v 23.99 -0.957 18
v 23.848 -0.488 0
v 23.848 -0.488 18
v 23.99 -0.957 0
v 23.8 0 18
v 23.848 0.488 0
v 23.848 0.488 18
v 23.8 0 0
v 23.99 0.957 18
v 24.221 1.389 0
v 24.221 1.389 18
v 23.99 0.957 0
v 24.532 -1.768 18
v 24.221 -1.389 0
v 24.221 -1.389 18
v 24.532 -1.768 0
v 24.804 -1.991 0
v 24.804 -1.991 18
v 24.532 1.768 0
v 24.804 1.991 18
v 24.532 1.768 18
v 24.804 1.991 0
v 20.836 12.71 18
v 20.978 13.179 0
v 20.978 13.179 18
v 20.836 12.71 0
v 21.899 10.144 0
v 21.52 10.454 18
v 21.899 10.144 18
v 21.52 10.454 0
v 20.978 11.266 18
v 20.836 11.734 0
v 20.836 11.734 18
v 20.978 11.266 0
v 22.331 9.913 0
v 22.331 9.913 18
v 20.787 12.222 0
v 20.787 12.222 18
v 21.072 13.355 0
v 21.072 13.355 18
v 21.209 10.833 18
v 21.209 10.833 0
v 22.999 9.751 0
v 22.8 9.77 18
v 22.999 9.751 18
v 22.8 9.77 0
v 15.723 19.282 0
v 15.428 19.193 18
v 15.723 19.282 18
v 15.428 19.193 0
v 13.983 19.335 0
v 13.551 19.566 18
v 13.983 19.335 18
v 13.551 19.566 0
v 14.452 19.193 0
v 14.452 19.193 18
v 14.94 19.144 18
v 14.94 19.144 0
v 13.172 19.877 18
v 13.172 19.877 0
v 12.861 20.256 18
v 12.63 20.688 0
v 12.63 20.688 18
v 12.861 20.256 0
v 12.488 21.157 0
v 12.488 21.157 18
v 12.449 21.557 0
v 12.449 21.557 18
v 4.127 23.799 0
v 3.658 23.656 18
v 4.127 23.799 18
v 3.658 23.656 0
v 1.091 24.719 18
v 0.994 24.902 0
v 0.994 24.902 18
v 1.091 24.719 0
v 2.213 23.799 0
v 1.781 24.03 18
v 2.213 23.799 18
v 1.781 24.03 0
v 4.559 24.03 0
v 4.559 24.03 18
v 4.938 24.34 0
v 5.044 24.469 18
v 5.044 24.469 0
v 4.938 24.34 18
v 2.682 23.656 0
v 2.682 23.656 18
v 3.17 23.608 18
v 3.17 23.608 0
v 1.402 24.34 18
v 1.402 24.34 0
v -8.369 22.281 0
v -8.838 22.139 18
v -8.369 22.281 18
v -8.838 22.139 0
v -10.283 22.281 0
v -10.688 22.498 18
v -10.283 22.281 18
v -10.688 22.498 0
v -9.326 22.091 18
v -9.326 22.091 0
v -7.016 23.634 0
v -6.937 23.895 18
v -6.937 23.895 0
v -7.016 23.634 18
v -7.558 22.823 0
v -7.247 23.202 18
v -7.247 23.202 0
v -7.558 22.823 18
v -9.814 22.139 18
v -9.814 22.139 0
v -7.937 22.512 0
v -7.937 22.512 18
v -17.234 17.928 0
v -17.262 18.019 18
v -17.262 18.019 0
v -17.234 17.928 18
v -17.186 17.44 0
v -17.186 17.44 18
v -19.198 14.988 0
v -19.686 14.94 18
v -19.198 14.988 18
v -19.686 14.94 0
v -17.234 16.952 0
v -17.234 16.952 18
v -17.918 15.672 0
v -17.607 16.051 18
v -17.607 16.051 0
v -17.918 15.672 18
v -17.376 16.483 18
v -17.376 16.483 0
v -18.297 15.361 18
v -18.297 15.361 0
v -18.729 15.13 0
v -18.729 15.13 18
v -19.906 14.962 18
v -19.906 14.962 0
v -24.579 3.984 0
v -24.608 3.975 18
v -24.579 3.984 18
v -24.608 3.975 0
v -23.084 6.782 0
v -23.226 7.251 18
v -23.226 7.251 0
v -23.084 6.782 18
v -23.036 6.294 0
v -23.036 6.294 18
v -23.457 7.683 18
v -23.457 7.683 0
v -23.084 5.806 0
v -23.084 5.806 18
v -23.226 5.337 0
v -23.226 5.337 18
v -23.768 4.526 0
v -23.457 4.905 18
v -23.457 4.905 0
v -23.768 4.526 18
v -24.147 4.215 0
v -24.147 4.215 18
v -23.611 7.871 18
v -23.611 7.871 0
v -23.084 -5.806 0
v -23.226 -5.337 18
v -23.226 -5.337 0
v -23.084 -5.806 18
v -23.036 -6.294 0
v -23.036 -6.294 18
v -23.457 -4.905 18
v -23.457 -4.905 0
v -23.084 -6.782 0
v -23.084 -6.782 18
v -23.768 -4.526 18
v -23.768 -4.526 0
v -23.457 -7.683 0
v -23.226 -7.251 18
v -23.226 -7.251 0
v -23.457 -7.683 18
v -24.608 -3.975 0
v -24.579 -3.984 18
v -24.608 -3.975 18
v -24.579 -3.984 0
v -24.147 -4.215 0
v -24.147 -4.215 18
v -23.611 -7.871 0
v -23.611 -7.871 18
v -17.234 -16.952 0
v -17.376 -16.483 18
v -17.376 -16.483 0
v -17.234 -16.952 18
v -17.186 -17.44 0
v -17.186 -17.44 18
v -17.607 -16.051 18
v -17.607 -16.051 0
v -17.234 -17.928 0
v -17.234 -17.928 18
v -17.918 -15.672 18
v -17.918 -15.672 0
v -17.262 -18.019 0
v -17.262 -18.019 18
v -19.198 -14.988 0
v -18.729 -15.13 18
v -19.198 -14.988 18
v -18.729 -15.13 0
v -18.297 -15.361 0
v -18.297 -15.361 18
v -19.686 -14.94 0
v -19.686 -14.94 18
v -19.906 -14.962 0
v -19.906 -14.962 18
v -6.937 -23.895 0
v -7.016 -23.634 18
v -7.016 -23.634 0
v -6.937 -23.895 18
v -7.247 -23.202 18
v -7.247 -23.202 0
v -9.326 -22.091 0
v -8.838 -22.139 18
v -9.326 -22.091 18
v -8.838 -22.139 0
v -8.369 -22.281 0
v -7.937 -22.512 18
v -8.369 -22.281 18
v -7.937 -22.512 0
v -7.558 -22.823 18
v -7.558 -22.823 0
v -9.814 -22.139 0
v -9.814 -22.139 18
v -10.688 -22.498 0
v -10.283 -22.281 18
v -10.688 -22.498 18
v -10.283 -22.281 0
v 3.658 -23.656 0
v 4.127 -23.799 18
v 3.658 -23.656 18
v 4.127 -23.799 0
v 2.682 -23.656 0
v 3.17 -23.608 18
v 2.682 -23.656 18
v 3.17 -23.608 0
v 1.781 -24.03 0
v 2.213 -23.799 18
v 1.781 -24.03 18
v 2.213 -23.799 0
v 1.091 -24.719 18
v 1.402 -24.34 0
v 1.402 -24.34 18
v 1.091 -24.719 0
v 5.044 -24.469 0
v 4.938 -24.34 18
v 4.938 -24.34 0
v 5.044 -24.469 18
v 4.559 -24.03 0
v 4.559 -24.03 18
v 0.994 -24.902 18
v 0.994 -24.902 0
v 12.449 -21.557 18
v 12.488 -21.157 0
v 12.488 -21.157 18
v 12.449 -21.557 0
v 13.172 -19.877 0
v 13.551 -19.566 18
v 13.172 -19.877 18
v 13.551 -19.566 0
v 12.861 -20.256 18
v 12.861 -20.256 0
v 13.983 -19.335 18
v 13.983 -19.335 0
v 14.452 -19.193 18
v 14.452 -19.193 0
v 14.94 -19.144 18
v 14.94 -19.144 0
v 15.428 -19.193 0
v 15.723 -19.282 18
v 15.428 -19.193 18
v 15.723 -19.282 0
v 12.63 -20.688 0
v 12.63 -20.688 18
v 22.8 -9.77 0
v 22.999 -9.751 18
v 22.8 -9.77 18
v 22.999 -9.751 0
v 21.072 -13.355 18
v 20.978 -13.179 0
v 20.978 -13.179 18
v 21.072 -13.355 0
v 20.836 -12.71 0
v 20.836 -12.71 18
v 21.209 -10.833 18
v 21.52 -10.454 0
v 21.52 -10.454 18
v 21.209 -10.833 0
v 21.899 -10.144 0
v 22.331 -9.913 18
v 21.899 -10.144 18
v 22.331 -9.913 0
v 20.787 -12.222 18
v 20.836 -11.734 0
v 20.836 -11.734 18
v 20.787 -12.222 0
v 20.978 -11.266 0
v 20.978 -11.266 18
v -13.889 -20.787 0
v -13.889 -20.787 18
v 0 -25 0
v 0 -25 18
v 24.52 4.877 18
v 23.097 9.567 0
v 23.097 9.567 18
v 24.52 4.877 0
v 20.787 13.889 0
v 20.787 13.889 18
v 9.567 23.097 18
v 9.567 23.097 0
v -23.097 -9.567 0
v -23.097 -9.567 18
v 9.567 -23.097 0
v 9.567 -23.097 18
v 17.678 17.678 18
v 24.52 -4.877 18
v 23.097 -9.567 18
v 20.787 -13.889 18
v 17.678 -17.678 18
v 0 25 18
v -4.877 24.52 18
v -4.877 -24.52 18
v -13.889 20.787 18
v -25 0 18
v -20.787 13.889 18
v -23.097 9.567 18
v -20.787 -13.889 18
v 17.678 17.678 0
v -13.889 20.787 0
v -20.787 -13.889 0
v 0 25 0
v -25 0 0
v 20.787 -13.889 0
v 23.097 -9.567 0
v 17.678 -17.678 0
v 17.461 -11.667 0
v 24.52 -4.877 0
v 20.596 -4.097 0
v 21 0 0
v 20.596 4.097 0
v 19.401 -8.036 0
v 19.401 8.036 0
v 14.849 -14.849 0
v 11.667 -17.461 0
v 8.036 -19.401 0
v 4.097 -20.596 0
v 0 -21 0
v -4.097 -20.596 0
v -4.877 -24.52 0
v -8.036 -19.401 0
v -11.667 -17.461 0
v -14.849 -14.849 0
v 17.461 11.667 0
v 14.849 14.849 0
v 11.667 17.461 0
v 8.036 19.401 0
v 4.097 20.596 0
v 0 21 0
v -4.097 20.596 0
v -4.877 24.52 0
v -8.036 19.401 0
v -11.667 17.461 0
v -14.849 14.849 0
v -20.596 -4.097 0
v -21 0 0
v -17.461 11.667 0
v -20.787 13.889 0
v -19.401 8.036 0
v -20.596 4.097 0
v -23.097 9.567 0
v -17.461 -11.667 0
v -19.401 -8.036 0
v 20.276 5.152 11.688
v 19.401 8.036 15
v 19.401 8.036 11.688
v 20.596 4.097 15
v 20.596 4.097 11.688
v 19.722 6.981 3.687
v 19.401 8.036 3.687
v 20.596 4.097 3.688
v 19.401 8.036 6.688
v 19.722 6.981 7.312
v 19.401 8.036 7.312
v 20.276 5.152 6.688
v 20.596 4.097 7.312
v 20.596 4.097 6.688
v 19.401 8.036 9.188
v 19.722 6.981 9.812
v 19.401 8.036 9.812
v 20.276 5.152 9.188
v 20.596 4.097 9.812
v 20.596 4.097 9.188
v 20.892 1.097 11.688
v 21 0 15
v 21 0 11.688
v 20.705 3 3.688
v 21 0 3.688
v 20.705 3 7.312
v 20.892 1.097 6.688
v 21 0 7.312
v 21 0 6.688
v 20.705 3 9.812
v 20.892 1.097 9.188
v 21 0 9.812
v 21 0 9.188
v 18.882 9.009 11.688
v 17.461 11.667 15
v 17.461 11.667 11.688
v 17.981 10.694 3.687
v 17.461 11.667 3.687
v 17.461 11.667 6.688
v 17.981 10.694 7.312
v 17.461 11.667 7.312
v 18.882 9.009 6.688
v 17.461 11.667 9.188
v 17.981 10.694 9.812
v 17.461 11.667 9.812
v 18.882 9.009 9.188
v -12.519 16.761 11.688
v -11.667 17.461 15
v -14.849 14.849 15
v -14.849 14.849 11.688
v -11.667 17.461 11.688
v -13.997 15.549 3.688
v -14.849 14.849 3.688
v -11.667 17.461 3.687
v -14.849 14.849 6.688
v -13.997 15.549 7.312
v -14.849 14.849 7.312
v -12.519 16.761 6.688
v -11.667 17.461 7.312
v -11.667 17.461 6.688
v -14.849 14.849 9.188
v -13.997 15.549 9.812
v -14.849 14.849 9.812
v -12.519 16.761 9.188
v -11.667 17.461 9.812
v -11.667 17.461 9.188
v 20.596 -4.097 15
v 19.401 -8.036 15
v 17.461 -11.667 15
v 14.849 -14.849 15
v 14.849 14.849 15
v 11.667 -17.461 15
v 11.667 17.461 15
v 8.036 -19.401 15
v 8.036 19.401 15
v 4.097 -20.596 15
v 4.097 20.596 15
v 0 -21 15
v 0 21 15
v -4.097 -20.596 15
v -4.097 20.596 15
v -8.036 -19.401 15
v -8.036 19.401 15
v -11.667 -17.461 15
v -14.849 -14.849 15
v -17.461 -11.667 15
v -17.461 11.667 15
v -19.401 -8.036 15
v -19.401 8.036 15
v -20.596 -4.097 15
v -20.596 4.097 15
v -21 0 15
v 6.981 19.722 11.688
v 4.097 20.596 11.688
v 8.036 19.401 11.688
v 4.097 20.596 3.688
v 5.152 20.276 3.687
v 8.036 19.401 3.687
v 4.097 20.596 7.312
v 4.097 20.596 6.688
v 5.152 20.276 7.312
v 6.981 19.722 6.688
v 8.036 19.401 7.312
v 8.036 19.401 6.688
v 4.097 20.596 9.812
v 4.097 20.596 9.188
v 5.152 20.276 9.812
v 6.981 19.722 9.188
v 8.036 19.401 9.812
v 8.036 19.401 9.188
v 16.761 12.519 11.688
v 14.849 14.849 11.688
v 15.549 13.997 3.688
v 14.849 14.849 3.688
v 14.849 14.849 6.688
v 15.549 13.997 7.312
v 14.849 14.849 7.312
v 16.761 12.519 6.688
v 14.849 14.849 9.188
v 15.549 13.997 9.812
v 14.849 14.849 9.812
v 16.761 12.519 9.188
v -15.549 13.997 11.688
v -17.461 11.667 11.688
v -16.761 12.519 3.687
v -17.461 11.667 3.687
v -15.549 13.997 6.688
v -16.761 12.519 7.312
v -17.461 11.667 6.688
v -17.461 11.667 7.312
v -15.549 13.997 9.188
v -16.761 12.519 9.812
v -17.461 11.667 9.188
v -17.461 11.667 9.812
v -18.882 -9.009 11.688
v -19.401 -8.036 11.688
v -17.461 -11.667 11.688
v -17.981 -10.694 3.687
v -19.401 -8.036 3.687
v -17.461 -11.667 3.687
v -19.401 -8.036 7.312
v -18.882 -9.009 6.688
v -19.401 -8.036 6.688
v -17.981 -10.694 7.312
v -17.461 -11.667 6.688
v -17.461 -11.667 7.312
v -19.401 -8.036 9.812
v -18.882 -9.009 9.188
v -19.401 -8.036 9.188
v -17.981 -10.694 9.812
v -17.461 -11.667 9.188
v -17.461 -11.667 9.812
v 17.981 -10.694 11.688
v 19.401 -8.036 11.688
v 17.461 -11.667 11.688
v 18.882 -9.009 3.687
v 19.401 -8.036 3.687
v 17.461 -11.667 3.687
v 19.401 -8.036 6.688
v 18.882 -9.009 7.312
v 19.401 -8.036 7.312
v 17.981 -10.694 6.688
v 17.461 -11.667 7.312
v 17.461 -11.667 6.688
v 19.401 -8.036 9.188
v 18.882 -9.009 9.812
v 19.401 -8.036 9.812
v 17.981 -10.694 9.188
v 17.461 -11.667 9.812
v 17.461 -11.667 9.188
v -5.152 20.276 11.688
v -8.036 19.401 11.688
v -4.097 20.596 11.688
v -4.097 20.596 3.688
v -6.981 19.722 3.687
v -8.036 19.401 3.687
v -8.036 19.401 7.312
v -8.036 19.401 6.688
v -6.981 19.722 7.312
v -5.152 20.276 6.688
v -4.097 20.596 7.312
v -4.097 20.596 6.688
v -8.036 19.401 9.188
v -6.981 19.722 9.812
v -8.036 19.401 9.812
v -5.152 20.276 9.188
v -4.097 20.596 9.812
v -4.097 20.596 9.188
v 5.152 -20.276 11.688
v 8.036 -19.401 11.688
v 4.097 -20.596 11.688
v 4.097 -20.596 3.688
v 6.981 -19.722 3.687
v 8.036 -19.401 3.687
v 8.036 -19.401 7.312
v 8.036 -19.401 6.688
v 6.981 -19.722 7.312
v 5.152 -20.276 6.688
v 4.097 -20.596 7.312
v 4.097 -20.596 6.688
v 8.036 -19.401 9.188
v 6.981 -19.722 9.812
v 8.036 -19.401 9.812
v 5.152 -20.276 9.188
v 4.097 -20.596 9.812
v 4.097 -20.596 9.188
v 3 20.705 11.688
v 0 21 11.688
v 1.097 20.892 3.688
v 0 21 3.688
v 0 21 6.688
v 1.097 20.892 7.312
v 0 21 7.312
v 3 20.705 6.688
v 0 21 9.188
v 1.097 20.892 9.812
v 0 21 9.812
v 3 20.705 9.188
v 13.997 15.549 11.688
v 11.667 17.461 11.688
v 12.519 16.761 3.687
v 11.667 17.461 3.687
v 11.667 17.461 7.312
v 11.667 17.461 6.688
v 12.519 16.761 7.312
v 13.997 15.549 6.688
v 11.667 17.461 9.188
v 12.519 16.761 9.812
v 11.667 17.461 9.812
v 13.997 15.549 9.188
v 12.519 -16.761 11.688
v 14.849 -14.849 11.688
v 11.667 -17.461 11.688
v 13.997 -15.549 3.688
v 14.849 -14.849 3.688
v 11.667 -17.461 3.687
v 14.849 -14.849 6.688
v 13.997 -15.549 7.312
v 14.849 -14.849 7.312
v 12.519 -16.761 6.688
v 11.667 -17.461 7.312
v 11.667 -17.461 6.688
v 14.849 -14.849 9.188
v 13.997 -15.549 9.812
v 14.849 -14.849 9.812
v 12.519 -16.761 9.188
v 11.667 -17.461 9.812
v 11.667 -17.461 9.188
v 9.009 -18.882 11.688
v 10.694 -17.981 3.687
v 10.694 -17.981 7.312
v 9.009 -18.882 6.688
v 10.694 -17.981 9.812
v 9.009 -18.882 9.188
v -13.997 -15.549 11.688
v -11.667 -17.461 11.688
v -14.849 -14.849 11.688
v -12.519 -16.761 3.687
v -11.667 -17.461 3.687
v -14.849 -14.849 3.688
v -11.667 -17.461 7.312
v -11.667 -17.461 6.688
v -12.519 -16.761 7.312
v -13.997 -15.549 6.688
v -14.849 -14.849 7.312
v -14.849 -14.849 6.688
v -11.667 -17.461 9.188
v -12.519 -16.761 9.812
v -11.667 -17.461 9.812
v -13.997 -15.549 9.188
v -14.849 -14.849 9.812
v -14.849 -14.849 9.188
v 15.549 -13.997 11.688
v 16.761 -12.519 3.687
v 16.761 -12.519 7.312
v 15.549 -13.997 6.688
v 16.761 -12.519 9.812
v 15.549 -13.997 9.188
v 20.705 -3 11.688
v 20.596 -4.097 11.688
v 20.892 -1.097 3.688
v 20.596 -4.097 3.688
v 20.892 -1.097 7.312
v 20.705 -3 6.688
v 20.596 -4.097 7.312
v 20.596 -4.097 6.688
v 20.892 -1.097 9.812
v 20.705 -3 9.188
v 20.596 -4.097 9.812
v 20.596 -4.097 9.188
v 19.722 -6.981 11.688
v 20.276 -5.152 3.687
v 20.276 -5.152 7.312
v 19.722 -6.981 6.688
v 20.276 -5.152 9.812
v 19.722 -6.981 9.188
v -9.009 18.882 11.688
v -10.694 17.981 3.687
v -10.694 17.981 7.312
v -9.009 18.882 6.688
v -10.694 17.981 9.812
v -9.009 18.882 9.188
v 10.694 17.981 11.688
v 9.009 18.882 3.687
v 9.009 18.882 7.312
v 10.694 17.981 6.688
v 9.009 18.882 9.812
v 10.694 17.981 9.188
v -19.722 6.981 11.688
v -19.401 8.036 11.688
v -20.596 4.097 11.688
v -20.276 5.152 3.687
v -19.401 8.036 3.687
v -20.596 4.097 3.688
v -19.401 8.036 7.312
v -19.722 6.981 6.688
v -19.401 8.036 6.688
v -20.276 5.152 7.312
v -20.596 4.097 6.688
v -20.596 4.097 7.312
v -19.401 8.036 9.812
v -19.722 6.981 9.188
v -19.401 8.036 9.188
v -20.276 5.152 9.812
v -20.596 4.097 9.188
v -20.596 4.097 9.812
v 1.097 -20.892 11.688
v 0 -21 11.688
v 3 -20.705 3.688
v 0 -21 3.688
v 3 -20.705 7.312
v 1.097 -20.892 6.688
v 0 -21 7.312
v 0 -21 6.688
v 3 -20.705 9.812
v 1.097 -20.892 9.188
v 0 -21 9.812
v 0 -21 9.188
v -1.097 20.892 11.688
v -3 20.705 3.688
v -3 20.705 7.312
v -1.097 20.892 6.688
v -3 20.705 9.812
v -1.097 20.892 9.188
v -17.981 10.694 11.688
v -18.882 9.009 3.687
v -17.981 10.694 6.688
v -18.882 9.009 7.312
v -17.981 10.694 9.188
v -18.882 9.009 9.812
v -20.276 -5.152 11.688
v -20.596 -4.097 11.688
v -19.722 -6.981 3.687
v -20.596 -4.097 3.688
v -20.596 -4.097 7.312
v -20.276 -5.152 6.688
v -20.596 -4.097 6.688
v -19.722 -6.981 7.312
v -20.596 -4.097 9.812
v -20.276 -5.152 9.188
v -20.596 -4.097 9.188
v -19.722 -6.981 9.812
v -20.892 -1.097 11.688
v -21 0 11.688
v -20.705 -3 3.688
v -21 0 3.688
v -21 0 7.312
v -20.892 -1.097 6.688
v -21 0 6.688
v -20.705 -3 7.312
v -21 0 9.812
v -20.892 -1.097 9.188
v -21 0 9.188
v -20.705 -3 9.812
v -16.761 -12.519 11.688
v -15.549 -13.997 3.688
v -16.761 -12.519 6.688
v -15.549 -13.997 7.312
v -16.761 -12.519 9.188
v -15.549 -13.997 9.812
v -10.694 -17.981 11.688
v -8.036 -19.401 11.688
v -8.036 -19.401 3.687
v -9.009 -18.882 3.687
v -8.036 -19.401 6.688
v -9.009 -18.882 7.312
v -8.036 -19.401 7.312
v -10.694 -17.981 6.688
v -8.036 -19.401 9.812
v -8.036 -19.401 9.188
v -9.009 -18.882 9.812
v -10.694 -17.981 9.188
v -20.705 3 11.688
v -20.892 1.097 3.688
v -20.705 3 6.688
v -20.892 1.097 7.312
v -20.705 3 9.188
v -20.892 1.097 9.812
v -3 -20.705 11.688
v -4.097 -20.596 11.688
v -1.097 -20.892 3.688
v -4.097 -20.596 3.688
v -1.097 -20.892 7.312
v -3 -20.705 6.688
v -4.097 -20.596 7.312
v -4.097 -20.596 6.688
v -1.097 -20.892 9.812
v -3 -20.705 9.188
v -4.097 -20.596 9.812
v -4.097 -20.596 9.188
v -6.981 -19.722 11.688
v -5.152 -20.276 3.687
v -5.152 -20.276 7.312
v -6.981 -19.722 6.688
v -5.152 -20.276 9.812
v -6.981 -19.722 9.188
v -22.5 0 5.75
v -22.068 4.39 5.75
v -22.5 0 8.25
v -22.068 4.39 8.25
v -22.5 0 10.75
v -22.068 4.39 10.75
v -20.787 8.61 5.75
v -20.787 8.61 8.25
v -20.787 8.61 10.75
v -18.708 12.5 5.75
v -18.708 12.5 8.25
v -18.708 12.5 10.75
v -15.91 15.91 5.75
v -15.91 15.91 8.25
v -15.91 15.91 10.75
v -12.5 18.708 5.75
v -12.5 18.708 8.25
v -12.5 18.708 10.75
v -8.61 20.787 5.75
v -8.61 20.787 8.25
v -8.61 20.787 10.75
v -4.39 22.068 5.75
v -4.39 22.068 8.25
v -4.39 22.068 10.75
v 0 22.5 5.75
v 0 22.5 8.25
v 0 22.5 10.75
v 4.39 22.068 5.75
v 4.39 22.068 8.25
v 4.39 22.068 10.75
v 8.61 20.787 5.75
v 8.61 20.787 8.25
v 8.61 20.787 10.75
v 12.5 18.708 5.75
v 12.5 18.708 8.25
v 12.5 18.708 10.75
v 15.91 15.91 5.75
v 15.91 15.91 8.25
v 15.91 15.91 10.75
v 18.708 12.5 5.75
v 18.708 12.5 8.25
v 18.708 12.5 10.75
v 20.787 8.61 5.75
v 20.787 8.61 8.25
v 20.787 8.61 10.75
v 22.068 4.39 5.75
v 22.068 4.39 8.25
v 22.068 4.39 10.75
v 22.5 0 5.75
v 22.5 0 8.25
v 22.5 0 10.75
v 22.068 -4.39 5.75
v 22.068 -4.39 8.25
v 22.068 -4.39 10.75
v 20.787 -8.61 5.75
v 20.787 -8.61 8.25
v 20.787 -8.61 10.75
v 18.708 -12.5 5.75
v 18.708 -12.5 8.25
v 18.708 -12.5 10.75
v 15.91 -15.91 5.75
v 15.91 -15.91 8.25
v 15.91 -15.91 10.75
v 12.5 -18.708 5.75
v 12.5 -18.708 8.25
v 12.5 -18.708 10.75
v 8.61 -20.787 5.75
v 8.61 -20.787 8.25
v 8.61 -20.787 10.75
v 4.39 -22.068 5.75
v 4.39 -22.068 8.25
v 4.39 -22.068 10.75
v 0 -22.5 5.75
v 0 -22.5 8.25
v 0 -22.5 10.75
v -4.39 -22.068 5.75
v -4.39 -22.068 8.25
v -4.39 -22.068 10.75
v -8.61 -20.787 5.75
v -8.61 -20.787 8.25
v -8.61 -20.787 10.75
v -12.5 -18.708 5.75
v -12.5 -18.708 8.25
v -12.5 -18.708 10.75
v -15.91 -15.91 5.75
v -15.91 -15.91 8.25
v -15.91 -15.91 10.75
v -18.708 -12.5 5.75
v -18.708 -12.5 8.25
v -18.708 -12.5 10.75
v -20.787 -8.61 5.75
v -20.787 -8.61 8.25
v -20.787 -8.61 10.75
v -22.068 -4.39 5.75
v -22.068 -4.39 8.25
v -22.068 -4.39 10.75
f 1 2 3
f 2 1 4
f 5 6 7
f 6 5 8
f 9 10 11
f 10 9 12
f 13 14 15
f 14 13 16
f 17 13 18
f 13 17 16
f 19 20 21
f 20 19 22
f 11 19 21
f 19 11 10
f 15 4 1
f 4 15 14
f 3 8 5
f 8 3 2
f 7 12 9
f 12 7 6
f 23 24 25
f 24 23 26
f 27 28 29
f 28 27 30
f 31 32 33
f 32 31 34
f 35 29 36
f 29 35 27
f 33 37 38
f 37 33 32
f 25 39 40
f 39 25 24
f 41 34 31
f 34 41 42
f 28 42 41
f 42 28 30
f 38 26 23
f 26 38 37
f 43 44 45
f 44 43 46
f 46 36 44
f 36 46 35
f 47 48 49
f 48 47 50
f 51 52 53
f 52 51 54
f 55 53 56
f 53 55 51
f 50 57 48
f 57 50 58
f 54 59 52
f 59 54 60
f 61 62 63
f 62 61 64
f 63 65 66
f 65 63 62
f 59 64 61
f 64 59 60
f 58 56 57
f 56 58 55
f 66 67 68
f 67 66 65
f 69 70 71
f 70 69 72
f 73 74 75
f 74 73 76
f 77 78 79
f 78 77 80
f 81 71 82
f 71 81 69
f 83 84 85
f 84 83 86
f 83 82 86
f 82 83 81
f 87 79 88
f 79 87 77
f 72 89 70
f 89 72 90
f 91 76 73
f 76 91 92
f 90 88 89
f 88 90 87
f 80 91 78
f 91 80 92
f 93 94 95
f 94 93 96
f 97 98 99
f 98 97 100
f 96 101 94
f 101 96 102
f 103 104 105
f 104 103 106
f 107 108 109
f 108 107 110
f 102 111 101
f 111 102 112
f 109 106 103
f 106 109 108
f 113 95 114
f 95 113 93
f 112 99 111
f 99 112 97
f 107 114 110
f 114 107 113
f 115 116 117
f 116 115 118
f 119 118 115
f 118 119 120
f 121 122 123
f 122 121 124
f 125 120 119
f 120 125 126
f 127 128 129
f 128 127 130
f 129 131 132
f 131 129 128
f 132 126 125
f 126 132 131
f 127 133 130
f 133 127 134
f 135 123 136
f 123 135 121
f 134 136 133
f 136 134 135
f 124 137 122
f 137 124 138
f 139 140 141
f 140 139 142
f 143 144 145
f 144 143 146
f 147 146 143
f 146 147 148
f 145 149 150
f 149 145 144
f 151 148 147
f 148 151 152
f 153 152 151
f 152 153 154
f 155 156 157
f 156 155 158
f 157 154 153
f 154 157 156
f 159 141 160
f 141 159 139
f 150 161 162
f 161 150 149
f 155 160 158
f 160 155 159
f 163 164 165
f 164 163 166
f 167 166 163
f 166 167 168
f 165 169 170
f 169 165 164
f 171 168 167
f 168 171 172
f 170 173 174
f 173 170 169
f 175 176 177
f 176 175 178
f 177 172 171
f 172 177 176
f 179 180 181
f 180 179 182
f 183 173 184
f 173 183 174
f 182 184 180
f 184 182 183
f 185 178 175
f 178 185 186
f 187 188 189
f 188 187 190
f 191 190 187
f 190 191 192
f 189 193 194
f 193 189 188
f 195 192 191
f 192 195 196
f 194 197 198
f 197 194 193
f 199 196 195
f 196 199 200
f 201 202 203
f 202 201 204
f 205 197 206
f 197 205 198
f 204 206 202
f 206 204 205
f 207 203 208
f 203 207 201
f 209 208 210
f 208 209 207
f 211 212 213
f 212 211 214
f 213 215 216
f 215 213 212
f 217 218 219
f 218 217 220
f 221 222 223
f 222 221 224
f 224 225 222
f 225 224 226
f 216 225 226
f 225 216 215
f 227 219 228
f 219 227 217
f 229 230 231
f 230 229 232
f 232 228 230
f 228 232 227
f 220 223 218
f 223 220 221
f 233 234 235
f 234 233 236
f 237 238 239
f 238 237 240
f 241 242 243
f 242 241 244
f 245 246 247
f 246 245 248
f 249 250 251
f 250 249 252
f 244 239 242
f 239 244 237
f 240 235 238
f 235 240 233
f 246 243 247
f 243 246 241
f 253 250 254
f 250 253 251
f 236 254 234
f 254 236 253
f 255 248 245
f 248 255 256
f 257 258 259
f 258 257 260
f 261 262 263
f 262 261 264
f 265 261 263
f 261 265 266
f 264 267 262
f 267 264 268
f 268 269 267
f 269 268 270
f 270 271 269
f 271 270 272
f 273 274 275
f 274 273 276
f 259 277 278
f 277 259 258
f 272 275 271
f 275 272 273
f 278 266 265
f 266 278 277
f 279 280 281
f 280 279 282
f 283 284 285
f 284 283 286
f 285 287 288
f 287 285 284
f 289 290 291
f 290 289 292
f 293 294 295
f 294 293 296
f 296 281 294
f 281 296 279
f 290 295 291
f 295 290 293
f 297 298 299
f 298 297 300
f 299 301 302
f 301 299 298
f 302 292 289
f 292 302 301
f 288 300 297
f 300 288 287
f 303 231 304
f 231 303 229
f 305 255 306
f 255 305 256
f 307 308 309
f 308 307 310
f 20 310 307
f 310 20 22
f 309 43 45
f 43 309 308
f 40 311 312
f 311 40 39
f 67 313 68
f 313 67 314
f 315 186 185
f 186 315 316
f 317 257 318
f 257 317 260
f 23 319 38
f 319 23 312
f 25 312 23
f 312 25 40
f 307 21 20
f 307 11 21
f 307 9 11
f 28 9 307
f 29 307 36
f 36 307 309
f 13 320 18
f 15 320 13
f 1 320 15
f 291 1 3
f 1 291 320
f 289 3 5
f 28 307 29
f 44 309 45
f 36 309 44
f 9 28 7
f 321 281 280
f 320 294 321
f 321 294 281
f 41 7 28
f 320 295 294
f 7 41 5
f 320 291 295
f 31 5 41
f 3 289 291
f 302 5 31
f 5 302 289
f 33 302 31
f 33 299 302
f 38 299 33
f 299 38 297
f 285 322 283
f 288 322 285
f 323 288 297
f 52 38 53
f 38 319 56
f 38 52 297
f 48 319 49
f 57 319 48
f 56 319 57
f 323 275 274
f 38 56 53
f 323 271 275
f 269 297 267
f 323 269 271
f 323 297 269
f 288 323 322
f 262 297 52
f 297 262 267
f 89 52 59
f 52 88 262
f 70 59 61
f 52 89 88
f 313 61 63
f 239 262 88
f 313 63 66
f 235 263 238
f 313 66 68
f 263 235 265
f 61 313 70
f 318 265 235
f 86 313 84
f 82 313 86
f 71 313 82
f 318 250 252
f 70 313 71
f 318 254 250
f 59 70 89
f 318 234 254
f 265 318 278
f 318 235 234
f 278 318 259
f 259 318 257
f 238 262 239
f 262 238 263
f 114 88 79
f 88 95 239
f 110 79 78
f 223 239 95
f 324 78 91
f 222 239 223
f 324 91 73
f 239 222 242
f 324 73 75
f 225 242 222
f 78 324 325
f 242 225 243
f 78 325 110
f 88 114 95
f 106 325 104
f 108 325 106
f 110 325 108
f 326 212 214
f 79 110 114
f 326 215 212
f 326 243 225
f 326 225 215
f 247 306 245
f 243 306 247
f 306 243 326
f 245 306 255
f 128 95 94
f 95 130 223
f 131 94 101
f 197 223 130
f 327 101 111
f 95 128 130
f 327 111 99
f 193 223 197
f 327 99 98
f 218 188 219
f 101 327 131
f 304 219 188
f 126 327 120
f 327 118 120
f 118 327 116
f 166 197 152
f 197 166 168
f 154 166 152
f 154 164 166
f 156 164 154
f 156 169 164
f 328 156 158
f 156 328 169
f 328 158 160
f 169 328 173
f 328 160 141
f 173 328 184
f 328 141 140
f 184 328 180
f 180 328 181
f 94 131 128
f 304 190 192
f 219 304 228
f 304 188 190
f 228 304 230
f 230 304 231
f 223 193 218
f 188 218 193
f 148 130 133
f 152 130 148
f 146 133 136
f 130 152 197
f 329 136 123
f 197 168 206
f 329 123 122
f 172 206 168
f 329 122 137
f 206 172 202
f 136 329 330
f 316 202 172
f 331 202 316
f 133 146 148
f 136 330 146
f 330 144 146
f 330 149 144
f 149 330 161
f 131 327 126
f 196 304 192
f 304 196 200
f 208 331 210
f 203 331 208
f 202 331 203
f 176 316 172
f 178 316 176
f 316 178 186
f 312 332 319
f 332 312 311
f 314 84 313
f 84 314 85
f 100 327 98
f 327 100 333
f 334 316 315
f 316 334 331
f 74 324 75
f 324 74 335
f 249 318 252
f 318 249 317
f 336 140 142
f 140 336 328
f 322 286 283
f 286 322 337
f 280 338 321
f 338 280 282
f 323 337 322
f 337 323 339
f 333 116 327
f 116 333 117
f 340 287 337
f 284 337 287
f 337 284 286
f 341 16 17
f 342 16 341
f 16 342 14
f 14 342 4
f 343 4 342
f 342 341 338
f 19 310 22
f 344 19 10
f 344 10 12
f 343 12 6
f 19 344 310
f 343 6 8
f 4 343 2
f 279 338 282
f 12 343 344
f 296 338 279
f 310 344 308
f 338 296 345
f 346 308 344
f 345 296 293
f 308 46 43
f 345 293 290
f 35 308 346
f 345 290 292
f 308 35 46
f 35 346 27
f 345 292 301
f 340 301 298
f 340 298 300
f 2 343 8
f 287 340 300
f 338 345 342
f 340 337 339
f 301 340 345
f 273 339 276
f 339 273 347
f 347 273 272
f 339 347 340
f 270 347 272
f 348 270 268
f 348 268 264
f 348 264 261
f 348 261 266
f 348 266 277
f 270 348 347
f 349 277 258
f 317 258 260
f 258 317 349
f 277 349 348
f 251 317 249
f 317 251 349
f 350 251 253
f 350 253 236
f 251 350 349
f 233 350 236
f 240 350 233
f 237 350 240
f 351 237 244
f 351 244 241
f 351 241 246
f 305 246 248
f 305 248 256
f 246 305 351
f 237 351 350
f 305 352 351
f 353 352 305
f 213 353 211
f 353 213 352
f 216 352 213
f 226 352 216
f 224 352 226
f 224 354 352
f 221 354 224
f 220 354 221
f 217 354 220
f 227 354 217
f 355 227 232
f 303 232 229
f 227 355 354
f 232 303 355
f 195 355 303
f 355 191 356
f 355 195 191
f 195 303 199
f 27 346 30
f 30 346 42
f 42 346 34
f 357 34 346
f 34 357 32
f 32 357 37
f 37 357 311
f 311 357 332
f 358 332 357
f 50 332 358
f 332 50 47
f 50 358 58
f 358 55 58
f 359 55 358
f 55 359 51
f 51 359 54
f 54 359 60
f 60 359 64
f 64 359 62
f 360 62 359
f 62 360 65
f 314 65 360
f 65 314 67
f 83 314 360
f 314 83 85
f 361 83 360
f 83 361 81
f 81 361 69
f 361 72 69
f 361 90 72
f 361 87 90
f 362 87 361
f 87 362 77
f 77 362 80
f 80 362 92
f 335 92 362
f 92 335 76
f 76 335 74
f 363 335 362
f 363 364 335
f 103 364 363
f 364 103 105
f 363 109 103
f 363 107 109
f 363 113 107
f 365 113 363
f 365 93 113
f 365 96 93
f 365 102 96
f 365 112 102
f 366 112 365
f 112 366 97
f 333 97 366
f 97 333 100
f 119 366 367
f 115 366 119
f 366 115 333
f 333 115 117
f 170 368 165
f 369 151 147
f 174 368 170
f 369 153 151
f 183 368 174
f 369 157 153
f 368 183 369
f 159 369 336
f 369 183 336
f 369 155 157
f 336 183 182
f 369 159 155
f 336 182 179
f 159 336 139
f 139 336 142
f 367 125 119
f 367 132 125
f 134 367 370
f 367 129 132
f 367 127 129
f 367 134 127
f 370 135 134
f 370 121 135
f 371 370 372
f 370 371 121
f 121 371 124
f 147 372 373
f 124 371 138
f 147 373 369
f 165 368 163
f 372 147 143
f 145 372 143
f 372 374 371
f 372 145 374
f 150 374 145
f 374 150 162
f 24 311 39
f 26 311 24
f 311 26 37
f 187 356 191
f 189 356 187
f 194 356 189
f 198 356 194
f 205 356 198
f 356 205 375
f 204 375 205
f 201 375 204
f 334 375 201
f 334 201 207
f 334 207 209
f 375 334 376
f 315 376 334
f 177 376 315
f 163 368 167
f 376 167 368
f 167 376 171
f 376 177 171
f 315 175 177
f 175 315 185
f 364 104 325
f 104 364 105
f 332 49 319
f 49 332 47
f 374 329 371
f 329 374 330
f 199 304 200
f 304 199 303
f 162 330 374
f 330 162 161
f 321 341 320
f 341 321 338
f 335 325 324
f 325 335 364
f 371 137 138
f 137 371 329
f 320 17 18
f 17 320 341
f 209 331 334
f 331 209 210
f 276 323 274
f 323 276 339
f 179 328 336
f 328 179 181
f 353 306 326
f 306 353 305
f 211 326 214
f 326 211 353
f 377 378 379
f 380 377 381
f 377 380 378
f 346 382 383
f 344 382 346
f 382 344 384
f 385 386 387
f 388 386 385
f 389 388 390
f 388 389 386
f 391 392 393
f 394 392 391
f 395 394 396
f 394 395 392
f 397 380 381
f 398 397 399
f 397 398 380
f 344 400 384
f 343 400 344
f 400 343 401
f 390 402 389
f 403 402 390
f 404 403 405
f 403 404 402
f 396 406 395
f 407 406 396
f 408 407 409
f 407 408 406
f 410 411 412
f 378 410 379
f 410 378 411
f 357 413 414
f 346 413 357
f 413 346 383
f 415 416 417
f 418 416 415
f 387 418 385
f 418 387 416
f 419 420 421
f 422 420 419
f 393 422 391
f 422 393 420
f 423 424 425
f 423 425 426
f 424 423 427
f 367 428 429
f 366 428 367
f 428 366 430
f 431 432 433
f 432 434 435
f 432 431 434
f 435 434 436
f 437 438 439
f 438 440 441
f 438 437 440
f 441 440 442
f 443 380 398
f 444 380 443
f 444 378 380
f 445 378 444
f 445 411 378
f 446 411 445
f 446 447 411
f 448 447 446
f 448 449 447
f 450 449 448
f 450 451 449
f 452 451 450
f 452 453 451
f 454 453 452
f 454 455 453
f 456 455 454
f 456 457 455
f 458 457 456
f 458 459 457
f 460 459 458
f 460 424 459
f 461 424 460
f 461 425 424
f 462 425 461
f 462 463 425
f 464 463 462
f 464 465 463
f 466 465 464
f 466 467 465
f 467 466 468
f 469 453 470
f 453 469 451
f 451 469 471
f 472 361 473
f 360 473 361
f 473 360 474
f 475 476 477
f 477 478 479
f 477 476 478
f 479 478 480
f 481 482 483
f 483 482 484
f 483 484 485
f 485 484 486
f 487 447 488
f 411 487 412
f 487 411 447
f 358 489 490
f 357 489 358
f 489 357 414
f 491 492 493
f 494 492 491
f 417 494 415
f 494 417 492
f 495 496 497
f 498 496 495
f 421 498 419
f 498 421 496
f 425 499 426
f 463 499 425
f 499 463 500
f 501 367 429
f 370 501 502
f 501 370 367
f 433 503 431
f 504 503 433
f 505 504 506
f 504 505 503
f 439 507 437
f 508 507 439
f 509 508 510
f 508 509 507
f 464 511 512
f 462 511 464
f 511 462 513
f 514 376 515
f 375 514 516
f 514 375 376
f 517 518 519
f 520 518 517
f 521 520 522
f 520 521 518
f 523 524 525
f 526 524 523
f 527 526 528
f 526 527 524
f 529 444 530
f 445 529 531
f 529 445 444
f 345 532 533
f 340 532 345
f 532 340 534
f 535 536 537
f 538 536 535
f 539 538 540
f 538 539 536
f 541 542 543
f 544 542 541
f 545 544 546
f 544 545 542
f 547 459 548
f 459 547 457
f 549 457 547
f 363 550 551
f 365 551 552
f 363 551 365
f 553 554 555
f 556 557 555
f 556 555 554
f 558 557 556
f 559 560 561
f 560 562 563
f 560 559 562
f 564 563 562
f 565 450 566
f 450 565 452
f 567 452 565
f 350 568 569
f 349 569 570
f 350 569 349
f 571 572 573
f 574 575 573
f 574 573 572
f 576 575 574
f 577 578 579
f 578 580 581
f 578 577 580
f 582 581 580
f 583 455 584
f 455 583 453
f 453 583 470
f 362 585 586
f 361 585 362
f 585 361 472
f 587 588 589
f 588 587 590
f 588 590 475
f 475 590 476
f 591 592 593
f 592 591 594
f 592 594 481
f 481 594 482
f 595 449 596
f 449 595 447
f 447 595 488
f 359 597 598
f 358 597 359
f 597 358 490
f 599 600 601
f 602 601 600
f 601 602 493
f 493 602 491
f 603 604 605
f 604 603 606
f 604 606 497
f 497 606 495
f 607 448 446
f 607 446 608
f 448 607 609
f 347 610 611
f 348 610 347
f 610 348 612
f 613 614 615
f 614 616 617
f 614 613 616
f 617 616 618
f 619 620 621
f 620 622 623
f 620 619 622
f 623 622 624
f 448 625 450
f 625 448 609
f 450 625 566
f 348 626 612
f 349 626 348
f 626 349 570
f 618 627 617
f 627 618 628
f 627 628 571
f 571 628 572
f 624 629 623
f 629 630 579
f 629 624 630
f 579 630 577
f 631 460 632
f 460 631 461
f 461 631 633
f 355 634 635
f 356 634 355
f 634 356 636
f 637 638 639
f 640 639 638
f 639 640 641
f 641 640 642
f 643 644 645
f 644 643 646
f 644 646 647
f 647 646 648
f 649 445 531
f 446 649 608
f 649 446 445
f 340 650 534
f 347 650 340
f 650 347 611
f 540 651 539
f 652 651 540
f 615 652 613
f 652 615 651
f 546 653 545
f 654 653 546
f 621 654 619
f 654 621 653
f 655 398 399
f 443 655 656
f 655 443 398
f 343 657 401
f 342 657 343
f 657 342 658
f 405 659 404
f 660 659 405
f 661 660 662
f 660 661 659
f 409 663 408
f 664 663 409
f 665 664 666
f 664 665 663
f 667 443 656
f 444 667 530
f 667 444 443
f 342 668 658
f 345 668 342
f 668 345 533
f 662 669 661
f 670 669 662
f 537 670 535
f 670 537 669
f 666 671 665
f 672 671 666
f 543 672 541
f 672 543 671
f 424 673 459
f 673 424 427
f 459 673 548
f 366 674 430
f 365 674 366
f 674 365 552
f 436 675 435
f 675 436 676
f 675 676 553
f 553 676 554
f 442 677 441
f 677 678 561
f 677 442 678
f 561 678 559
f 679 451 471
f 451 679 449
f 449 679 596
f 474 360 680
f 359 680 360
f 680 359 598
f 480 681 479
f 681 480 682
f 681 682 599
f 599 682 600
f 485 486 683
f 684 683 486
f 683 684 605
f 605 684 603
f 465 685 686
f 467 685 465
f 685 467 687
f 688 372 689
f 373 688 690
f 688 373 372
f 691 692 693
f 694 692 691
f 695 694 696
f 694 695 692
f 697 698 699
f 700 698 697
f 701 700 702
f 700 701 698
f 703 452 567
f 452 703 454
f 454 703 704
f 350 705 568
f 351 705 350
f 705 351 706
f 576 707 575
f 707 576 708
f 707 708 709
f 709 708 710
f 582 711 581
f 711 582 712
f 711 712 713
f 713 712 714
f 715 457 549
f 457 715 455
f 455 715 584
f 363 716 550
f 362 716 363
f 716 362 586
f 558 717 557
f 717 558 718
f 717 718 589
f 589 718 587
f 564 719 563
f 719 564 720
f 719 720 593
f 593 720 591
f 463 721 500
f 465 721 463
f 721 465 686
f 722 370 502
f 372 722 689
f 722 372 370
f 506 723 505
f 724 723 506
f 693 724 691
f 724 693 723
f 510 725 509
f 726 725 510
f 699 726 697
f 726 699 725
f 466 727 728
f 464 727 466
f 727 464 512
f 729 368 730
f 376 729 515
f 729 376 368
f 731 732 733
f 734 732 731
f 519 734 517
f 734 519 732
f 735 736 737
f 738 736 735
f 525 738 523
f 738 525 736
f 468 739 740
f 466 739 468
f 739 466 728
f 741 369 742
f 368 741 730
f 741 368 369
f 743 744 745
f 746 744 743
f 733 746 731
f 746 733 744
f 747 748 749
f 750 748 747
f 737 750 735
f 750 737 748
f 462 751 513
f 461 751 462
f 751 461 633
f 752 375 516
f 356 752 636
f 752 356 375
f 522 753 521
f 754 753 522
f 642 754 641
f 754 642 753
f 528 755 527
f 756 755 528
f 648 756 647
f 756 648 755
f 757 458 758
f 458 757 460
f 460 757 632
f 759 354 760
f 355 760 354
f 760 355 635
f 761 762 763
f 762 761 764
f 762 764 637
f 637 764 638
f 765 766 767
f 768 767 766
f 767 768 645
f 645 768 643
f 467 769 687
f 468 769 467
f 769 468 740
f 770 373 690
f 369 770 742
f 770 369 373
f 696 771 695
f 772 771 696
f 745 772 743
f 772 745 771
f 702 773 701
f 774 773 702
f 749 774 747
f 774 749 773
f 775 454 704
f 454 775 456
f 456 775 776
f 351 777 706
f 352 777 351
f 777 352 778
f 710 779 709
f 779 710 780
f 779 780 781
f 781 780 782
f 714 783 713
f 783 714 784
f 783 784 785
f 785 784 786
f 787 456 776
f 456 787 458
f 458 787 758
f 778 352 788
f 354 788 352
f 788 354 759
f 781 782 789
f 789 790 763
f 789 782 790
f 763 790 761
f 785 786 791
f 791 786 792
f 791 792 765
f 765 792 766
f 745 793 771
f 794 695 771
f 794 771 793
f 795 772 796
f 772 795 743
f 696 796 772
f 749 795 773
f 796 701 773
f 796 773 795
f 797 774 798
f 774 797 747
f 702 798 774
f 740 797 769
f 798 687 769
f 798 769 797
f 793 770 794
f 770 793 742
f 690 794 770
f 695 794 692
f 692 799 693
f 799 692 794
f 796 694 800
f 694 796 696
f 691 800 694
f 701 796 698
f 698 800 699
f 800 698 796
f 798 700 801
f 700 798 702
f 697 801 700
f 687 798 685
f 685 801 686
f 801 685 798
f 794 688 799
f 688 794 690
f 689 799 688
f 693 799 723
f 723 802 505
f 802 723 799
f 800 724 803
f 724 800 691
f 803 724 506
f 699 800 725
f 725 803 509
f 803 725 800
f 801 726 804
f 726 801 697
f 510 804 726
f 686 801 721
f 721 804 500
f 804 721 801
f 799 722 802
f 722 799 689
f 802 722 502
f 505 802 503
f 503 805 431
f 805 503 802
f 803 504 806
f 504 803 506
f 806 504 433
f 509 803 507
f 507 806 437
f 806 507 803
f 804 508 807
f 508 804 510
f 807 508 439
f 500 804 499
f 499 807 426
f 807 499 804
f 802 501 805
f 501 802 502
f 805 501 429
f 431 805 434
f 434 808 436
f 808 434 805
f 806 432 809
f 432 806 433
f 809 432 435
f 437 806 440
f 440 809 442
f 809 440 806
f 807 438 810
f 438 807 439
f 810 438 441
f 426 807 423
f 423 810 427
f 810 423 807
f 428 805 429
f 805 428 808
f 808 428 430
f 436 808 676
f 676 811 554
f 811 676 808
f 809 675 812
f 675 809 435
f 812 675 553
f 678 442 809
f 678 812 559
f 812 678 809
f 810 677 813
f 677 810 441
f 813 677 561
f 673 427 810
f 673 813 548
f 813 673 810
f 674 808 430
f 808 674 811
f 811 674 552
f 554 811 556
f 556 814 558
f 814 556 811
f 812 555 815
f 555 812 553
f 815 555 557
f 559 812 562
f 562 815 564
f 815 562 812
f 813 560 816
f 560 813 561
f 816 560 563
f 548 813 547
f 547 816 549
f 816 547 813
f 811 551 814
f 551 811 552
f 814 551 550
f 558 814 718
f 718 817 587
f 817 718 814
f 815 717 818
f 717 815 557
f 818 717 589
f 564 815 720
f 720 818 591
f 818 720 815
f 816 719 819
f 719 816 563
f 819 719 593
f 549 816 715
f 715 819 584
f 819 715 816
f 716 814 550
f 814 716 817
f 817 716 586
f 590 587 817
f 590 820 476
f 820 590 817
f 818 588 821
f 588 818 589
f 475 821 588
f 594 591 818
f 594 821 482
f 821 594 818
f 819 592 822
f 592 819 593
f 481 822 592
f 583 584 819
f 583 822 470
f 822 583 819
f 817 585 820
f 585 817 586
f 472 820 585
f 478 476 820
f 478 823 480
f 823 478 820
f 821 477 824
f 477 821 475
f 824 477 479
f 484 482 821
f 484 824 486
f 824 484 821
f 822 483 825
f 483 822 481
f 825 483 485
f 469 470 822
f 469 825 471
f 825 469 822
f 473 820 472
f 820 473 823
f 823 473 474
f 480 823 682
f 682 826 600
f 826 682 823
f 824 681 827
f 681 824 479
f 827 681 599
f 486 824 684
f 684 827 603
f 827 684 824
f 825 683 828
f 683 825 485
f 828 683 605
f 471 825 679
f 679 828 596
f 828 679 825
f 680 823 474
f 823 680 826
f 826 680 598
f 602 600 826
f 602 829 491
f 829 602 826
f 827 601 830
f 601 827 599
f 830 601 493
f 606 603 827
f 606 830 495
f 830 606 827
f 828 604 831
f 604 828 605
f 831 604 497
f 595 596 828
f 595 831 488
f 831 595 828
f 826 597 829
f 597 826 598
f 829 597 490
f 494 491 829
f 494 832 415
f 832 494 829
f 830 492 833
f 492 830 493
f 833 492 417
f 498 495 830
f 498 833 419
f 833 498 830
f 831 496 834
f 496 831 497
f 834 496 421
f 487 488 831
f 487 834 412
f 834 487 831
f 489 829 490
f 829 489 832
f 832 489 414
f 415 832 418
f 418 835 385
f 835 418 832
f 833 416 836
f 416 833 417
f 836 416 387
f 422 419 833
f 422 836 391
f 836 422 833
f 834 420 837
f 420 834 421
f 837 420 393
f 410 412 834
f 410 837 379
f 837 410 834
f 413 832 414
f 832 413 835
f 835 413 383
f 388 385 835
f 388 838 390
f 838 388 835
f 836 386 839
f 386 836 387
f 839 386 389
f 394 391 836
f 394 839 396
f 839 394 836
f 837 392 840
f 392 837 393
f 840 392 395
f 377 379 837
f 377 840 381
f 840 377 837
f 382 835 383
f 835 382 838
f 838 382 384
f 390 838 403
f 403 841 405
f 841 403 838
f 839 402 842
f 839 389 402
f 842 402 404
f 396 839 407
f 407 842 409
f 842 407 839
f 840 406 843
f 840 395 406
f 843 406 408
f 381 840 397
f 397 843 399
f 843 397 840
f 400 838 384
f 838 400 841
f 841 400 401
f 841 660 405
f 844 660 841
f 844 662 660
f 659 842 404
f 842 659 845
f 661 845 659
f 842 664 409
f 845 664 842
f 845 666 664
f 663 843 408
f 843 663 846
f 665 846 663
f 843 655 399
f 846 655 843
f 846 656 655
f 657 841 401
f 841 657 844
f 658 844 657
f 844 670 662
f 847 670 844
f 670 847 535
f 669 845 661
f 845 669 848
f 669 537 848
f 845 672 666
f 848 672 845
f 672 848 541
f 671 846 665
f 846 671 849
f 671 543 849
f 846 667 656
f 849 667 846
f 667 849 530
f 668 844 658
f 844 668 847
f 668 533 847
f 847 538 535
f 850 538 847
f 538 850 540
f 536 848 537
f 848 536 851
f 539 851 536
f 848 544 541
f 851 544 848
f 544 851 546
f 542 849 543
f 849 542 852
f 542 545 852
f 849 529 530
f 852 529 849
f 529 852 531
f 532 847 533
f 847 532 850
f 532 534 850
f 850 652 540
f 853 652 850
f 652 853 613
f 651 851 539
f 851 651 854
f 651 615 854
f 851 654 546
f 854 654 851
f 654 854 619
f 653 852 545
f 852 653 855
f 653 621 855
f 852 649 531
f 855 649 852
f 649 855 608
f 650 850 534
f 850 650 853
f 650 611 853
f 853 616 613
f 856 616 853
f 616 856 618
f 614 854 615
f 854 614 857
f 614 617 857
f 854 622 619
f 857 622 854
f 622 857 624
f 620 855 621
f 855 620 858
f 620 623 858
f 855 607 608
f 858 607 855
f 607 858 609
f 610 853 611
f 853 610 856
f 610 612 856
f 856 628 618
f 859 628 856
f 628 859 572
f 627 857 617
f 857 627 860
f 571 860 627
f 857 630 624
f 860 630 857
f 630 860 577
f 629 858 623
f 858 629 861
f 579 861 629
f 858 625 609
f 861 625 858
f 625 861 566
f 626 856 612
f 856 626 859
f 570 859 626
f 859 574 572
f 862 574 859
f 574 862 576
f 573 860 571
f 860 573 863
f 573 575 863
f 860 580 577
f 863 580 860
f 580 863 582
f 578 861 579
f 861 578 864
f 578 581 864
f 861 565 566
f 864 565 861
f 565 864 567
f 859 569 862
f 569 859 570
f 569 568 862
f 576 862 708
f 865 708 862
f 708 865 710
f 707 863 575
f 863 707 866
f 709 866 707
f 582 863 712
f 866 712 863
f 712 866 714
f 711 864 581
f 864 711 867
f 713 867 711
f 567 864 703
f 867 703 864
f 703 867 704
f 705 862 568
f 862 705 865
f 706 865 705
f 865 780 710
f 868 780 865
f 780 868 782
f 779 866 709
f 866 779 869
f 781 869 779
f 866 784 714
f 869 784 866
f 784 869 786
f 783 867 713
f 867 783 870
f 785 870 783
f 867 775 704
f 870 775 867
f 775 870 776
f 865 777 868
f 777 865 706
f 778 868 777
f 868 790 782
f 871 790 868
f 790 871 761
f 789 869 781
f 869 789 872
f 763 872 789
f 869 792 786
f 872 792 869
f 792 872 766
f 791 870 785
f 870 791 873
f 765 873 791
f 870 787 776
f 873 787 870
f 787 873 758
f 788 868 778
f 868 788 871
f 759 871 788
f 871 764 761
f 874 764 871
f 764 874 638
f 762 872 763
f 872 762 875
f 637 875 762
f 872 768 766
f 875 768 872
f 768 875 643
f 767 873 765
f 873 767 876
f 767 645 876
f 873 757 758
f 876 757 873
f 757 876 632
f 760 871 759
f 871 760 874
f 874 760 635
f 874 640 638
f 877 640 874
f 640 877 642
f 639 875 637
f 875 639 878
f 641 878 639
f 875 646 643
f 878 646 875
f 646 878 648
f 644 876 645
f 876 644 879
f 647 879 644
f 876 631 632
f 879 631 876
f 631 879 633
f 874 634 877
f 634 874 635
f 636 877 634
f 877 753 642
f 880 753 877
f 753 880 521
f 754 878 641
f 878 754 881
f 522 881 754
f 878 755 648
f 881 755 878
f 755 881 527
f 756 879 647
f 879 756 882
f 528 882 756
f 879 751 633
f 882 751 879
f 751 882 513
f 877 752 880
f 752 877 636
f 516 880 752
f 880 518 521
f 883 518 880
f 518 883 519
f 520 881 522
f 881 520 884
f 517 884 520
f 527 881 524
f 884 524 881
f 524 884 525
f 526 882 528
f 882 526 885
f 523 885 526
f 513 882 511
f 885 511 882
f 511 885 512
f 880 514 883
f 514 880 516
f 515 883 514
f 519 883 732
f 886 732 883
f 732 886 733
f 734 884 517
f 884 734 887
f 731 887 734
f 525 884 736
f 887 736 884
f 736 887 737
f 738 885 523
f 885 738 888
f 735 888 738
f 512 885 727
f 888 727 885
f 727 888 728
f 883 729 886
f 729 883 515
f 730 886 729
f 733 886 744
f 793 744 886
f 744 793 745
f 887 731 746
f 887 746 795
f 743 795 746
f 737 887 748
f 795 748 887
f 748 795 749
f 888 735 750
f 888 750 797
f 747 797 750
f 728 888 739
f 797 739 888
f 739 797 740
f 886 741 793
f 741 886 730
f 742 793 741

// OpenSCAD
$fn = 32;

// ----------------------------------------------------------------------
// Threaded cap: 50 mm body, 18 mm tall, 42 mm threaded bore
// ----------------------------------------------------------------------

// --- parameters (mm) ---
outer_d = 50;             // cap outside diameter
body_h = 18;              // cap height
top_t = 3;                // closed top thickness
bore_d = 42;              // bore core diameter
pitch = 2.5;              // thread pitch
thread_d = 1.5;           // thread depth
thread_z = 3;             // thread start above the rim
thread_h = 9;             // threaded height
flutes = 13;              // number of knurl flutes
flute_d = 5;              // flute cutter diameter
flute_depth = 1.2;        // flute depth into the rim

difference() {
  union() {
    cylinder(h = 18, d = outer_d);
  }
  /* threaded bore, closed at the top */
  translate([0, 0, -2.5]) cylinder(h = 17.5, d = bore_d);
  translate([0, 0, 3]) rotate_extrude() polygon([[20, 0], [20, 9], [20.5, 9], [22.5, 7.75], [20.5, 6.5], [22.5, 5.25], [20.5, 4], [22.5, 2.75], [20.5, 0], [20, 0]]);
  /* knurl flutes around the rim */
  for (i = [0 : flutes - 1]) {
    a = i * 360 / flutes;
    translate([(outer_d / 2 + flute_d / 2 - flute_depth) * cos(a), (outer_d / 2 + flute_d / 2 - flute_depth) * sin(a), -2.5]) cylinder(h = body_h + 5, d = flute_d);
  }
}
